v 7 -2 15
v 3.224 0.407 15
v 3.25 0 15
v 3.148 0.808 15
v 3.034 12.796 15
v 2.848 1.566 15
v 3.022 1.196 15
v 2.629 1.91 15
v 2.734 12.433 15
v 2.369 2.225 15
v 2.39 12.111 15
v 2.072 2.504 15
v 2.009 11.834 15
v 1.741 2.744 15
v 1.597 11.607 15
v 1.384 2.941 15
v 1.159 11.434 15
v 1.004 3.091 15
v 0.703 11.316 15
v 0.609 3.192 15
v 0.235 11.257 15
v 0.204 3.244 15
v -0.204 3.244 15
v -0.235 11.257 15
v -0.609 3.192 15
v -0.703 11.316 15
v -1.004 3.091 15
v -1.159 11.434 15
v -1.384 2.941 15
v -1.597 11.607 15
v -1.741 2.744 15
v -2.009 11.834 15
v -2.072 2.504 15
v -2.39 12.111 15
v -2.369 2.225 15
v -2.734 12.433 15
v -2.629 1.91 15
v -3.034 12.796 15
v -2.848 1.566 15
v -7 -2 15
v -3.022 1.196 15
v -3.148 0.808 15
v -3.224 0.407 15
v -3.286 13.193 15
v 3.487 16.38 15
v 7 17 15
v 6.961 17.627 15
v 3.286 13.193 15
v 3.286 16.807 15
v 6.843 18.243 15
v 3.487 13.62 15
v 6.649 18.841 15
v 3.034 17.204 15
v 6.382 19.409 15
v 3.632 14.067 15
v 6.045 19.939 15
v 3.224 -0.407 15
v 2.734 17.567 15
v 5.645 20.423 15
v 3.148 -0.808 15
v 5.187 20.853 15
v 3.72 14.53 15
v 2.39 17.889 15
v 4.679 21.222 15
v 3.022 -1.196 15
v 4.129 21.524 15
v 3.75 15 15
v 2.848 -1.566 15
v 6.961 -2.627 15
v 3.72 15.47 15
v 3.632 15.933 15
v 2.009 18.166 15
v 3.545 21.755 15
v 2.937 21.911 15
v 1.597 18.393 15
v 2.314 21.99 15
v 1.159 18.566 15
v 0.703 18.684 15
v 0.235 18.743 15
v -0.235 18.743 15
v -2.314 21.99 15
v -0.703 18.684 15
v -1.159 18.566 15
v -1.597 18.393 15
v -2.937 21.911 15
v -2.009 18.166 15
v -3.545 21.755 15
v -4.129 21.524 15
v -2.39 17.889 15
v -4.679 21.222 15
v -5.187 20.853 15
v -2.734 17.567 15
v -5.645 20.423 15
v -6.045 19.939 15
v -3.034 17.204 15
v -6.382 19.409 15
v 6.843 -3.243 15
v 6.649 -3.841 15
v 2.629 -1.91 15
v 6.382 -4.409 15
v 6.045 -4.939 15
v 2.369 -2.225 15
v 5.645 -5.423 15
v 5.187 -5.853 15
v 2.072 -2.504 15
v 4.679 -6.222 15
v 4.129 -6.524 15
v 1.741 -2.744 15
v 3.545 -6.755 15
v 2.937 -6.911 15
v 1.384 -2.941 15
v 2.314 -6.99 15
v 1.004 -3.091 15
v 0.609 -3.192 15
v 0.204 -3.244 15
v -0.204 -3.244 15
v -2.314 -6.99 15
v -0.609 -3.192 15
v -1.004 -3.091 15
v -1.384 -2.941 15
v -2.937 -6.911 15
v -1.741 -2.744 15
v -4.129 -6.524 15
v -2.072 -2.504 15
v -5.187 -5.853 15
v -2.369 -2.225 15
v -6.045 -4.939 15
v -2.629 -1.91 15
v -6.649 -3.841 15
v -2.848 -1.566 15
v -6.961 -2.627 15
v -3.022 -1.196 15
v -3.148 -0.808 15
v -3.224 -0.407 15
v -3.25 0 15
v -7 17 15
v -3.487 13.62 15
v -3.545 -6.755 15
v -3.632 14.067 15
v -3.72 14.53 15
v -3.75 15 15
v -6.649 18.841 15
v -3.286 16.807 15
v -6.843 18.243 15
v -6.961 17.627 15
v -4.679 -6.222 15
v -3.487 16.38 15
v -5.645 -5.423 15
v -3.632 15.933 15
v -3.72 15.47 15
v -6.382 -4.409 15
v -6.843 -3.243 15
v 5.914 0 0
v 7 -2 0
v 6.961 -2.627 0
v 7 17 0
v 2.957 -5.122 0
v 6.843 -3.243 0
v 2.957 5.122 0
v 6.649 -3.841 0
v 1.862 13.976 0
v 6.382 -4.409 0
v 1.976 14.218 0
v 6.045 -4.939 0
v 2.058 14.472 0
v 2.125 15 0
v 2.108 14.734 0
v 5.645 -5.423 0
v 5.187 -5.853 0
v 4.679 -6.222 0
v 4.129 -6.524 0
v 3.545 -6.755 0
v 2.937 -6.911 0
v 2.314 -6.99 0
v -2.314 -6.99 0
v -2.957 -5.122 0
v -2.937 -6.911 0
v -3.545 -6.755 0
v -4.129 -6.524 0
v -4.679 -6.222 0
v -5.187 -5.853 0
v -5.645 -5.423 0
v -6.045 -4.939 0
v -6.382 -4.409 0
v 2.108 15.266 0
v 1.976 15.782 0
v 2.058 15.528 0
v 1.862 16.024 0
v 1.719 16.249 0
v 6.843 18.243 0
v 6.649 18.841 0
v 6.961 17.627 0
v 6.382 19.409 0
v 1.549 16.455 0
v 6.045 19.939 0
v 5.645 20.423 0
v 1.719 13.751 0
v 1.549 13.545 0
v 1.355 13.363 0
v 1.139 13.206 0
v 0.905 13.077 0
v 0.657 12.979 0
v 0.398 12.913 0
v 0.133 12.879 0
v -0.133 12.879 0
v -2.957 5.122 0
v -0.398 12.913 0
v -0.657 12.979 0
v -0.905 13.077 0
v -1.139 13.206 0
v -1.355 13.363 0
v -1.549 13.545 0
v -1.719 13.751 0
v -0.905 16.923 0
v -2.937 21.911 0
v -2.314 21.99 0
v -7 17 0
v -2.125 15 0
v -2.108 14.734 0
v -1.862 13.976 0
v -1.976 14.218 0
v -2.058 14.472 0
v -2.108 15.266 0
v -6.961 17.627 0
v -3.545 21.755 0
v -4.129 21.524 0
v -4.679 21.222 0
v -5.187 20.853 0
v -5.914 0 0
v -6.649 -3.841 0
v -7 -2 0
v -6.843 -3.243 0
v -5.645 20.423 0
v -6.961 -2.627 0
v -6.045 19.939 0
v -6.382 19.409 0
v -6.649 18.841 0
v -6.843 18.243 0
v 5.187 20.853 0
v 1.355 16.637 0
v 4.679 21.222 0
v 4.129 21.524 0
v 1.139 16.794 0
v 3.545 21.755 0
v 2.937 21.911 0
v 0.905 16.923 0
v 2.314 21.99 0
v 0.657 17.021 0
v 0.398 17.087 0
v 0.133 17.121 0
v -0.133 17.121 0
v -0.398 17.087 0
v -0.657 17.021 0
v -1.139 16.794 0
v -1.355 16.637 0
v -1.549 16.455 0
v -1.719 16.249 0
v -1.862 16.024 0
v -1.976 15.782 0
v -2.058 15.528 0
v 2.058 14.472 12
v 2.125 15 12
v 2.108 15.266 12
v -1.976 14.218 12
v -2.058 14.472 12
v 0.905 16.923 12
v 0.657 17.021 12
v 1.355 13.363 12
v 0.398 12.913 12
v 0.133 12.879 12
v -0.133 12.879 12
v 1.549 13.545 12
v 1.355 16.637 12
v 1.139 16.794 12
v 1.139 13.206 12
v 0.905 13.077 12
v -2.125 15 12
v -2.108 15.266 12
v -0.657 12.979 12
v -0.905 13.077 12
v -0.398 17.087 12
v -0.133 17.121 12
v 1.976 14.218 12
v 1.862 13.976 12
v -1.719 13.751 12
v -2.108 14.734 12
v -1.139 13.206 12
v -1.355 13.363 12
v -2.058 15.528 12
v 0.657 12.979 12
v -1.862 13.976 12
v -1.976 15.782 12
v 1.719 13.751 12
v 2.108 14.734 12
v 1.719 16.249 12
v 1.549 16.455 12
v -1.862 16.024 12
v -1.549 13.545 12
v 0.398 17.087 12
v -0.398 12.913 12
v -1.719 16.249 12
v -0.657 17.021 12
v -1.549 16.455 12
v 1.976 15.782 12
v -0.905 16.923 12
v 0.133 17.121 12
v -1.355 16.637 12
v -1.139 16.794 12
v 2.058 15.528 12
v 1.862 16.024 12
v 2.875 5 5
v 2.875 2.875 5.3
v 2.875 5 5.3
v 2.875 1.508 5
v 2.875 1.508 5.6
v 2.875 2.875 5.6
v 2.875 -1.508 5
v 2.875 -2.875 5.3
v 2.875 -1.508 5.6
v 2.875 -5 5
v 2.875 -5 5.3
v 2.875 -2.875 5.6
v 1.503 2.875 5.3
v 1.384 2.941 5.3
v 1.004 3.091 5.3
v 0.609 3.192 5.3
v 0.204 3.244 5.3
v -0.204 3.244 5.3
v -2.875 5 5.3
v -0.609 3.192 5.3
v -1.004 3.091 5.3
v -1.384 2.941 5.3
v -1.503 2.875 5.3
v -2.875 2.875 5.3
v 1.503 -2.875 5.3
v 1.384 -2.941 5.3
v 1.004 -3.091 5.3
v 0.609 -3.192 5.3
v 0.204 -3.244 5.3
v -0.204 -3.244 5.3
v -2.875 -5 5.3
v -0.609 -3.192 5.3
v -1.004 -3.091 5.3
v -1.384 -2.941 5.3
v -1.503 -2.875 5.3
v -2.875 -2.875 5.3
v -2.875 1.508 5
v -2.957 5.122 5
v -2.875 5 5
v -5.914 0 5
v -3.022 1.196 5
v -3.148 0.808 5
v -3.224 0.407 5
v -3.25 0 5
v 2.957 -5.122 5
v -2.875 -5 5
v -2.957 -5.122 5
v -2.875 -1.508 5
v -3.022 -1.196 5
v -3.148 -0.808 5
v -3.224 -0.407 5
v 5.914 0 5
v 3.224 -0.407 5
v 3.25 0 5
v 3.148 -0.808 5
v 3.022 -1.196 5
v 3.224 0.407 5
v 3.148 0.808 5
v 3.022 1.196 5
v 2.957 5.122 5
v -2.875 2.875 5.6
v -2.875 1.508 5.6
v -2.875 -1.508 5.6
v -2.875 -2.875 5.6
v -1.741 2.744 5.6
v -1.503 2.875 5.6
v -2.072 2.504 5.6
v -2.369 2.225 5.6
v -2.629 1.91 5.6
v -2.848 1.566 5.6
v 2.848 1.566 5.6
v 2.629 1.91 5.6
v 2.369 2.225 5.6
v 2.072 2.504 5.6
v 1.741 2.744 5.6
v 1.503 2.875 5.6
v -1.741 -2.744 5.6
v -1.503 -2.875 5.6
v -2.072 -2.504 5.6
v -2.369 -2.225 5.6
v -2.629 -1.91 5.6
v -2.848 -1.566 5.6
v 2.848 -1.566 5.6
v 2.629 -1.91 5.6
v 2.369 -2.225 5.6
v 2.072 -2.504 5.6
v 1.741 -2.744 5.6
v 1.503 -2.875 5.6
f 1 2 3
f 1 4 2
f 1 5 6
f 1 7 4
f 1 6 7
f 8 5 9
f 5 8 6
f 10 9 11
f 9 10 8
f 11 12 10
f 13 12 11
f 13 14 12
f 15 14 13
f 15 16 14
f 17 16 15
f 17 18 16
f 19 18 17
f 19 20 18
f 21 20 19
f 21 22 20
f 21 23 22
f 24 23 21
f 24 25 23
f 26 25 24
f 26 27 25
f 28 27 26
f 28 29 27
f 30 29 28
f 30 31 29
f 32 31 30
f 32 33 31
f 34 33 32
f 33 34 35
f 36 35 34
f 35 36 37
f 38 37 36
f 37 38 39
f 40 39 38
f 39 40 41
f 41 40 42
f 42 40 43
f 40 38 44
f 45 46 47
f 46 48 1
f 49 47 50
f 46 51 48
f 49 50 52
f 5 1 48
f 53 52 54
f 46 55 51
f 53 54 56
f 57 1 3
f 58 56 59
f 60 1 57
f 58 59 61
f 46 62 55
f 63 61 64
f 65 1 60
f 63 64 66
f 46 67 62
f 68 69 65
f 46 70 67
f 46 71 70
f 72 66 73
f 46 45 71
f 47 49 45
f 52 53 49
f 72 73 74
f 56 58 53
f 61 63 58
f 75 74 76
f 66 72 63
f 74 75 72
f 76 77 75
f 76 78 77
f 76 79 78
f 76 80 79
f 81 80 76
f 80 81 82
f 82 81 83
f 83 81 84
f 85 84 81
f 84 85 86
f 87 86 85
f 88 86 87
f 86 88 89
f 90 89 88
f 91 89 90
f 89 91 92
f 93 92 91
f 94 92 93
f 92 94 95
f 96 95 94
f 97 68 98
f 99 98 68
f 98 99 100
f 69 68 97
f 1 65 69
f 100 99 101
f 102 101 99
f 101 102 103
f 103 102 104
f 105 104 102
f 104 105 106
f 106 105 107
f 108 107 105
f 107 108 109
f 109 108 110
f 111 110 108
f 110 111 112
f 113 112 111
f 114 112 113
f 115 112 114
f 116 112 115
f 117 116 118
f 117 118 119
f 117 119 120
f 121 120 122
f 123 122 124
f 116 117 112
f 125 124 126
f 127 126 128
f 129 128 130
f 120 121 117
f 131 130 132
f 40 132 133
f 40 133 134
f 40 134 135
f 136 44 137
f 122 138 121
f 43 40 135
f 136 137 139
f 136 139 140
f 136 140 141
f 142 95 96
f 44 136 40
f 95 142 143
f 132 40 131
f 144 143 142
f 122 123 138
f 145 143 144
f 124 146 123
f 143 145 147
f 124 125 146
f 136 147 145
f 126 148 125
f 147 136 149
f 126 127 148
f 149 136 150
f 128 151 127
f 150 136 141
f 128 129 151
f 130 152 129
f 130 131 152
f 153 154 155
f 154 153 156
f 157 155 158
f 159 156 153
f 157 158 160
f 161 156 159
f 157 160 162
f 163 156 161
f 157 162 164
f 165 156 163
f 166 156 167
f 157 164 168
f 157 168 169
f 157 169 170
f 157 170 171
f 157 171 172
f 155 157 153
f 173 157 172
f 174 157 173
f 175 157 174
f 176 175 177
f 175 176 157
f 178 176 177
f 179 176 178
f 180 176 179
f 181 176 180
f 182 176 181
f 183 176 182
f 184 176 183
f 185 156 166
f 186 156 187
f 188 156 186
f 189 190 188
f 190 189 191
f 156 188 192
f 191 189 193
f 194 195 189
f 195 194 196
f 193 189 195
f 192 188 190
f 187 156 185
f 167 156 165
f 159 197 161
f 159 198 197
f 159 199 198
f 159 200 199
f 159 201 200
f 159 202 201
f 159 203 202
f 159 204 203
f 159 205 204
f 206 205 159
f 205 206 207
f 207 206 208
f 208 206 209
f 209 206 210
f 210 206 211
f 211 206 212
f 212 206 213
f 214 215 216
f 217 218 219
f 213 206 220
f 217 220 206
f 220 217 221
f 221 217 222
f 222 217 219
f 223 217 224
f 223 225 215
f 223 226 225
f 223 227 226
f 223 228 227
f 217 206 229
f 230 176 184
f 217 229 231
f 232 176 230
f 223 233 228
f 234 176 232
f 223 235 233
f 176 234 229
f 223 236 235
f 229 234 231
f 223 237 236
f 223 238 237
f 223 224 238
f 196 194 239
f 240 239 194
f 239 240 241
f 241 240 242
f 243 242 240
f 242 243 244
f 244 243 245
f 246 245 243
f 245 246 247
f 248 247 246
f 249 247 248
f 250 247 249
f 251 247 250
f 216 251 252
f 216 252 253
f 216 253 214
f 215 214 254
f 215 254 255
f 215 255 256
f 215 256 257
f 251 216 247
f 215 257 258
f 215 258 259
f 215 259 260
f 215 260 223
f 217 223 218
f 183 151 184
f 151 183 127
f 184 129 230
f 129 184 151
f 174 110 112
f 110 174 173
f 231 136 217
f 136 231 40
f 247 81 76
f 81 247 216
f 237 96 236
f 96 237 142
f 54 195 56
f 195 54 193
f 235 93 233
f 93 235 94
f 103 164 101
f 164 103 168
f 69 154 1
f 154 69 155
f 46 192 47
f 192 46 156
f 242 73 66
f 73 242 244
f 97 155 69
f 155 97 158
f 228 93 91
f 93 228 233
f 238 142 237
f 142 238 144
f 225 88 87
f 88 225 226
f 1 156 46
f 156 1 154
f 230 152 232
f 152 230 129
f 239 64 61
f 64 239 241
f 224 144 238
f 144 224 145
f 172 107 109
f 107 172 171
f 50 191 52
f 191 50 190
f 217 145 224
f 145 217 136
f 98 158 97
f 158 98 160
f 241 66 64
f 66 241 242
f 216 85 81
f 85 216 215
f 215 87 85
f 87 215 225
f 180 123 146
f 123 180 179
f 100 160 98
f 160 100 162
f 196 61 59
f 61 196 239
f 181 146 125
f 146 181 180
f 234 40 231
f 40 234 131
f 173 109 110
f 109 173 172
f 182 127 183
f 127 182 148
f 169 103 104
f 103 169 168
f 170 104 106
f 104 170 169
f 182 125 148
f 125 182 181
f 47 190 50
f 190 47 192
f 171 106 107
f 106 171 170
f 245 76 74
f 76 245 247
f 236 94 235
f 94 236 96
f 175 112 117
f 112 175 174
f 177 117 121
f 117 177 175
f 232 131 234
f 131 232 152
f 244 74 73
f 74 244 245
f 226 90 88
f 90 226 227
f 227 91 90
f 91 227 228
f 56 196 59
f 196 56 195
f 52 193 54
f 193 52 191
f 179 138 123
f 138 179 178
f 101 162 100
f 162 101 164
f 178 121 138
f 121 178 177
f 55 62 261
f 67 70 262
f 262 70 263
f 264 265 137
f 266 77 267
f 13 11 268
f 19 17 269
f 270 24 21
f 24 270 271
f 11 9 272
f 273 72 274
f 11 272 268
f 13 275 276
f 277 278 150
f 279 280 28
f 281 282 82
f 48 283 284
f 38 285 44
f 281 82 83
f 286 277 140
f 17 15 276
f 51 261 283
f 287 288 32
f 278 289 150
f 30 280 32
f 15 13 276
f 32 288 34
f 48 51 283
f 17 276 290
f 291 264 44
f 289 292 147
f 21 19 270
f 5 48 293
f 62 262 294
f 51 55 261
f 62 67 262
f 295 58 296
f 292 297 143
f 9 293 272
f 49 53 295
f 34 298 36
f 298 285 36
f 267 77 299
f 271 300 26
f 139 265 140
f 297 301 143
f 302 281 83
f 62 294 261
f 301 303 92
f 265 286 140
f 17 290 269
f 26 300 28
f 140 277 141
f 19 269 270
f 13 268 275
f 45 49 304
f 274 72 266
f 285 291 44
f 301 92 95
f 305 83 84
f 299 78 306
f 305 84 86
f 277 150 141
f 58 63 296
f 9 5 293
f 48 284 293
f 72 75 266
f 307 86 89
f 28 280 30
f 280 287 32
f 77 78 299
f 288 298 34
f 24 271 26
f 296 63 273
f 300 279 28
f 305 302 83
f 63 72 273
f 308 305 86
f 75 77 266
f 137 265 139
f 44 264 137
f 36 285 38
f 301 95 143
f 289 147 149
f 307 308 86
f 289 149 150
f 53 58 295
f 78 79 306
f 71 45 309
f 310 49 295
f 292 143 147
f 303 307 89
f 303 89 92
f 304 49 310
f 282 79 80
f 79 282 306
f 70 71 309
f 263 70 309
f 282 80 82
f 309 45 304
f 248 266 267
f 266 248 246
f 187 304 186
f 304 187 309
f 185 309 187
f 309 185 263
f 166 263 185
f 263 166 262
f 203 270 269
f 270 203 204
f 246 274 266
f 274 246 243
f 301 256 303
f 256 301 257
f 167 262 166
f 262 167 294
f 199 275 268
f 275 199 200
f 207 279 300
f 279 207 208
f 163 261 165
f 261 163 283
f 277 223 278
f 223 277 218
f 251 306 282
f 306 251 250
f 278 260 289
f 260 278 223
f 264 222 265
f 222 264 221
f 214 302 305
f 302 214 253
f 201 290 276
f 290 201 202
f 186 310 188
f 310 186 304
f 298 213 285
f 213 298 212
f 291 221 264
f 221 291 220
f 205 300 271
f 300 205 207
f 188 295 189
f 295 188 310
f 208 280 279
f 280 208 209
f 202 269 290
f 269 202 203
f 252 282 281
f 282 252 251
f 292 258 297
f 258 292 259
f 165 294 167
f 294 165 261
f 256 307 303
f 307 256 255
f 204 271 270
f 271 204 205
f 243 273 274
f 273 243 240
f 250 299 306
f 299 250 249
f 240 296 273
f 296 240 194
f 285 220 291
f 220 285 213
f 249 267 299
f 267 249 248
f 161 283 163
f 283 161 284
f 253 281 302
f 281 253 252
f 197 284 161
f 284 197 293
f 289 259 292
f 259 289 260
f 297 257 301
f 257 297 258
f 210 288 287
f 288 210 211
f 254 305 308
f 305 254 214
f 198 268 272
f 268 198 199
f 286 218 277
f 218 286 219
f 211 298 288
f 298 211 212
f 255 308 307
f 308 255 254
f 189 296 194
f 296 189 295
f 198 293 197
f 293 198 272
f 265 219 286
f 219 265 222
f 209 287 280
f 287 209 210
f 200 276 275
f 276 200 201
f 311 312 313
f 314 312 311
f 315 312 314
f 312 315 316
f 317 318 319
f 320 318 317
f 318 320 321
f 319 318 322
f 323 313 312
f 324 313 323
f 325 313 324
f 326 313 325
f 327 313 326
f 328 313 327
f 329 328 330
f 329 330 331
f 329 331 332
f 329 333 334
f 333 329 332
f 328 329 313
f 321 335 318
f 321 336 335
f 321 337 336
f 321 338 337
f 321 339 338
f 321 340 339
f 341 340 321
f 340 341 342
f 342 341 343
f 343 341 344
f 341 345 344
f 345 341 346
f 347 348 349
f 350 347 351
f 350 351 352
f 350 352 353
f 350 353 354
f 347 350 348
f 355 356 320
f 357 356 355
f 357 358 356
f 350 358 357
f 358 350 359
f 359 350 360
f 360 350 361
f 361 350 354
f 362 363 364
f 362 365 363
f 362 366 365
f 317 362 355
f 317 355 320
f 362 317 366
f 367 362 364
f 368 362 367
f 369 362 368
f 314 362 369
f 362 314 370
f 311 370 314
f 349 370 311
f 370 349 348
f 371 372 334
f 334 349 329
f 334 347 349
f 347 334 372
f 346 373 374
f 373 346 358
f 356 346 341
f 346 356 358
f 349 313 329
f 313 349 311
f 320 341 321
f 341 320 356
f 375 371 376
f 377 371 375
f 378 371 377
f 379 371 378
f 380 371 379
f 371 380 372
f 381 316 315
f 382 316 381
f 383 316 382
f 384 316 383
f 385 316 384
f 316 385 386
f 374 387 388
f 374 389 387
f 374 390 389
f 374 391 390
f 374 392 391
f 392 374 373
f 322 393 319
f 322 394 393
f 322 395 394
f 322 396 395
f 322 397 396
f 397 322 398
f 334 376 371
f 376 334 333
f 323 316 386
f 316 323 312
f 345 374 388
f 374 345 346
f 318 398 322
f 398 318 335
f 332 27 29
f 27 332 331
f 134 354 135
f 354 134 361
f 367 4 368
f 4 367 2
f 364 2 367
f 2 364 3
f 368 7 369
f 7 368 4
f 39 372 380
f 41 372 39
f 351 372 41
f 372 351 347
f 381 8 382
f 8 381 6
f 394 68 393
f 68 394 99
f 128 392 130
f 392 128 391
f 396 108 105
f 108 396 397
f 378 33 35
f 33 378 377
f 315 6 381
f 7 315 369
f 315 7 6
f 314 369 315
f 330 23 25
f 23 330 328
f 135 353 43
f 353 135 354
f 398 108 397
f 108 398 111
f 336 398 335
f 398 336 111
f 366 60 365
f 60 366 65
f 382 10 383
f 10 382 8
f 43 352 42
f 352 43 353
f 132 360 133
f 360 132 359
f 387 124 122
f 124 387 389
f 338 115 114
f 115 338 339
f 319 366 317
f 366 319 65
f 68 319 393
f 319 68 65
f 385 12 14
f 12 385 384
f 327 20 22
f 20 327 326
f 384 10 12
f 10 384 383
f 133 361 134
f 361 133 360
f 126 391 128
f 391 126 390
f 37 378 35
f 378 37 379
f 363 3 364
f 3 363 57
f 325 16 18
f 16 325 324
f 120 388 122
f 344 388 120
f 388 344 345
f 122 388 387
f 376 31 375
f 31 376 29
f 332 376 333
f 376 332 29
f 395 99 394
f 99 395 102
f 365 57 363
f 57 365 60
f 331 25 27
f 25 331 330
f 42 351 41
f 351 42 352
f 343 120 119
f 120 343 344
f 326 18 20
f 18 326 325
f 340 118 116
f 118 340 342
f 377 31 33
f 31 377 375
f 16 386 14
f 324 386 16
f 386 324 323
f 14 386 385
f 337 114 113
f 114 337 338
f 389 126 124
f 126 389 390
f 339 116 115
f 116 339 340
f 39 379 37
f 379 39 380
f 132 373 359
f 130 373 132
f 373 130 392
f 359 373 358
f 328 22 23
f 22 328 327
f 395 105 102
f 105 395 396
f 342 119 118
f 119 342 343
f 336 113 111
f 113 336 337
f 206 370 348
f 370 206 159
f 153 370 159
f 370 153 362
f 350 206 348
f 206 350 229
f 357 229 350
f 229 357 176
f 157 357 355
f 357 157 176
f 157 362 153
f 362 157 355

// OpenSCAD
$fn = 50;


difference() {
	union() {
		cylinder(h = 15, r = 7.0000000000);
		translate(v = [0.0000000000, 7.5000000000, 0]) {
			hull() {
				translate(v = [-2.0000000000, 9.5000000000, 0]) {
					cylinder(h = 15, r = 5);
				}
				translate(v = [2.0000000000, 9.5000000000, 0]) {
					cylinder(h = 15, r = 5);
				}
				translate(v = [-2.0000000000, -9.5000000000, 0]) {
					cylinder(h = 15, r = 5);
				}
				translate(v = [2.0000000000, -9.5000000000, 0]) {
					cylinder(h = 15, r = 5);
				}
			}
		}
		translate(v = [0.0000000000, 7.5000000000, 0]) {
			hull() {
				translate(v = [-2.0000000000, 9.5000000000, 0]) {
					cylinder(h = 15, r = 5);
				}
				translate(v = [2.0000000000, 9.5000000000, 0]) {
					cylinder(h = 15, r = 5);
				}
				translate(v = [-2.0000000000, -9.5000000000, 0]) {
					cylinder(h = 15, r = 5);
				}
				translate(v = [2.0000000000, -9.5000000000, 0]) {
					cylinder(h = 15, r = 5);
				}
			}
		}
	}
	union() {
		translate(v = [0.0000000000, 15.0000000000, 15]) {
			rotate(a = [0, 0, 0]) {
				difference() {
					union() {
						#translate(v = [0, 0, -15.0000000000]) {
							cylinder(h = 15, r = 2.0000000000);
						}
						#translate(v = [0, 0, -3]) {
							cylinder(h = 3, r1 = 2.1250000000, r2 = 3.7500000000);
						}
						#translate(v = [0, 0, -15.0000000000]) {
							cylinder(h = 15, r = 2.1250000000);
						}
						#translate(v = [0, 0, -15.0000000000]) {
							cylinder(h = 15, r = 2.0000000000);
						}
					}
					union();
				}
			}
		}
		translate(v = [0.0000000000, 15.0000000000, 15]) {
			rotate(a = [0, 0, 0]) {
				difference() {
					union() {
						#translate(v = [0, 0, -15.0000000000]) {
							cylinder(h = 15, r = 2.0000000000);
						}
						#translate(v = [0, 0, -3]) {
							cylinder(h = 3, r1 = 2.1250000000, r2 = 3.7500000000);
						}
						#translate(v = [0, 0, -15.0000000000]) {
							cylinder(h = 15, r = 2.1250000000);
						}
						#translate(v = [0, 0, -15.0000000000]) {
							cylinder(h = 15, r = 2.0000000000);
						}
					}
					union();
				}
			}
		}
		translate(v = [0.0000000000, 0.0000000000, 0]) {
			rotate(a = [0, 0, 0]) {
				difference() {
					union() {
						#translate(v = [-2.8750000000, -5.0000000000, -0.3000000000]) {
							cube(size = [5.7500000000, 10, 0.3000000000]);
						}
						#translate(v = [-2.8750000000, -2.8750000000, -0.6000000000]) {
							cube(size = [5.7500000000, 5.7500000000, 0.3000000000]);
						}
						#translate(v = [-2.8750000000, -5.0000000000, 5]) {
							cube(size = [5.7500000000, 10, 0.3000000000]);
						}
						#translate(v = [-2.8750000000, -2.8750000000, 5.3000000000]) {
							cube(size = [5.7500000000, 5.7500000000, 0.3000000000]);
						}
						#translate(v = [0, 0, -100.0000000000]) {
							cylinder(h = 200, r = 3.2500000000);
						}
						#linear_extrude(height = 5) {
							polygon(points = [[5.9142500000, 0.0000000000], [2.9571250000, 5.1218907443], [-2.9571250000, 5.1218907443], [-5.9142500000, 0.0000000000], [-2.9571250000, -5.1218907443], [2.9571250000, -5.1218907443]]);
						}
						#translate(v = [-2.8750000000, -5.0000000000, -0.3000000000]) {
							cube(size = [5.7500000000, 10, 0.3000000000]);
						}
						#translate(v = [-2.8750000000, -2.8750000000, -0.6000000000]) {
							cube(size = [5.7500000000, 5.7500000000, 0.3000000000]);
						}
						#translate(v = [-2.8750000000, -5.0000000000, 5]) {
							cube(size = [5.7500000000, 10, 0.3000000000]);
						}
						#translate(v = [-2.8750000000, -2.8750000000, 5.3000000000]) {
							cube(size = [5.7500000000, 5.7500000000, 0.3000000000]);
						}
						#translate(v = [0, 0, -100.0000000000]) {
							cylinder(h = 200, r = 3.2500000000);
						}
						#translate(v = [-2.8750000000, -5.0000000000, -0.3000000000]) {
							cube(size = [5.7500000000, 10, 0.3000000000]);
						}
						#translate(v = [-2.8750000000, -2.8750000000, -0.6000000000]) {
							cube(size = [5.7500000000, 5.7500000000, 0.3000000000]);
						}
						#translate(v = [-2.8750000000, -5.0000000000, 5]) {
							cube(size = [5.7500000000, 10, 0.3000000000]);
						}
						#translate(v = [-2.8750000000, -2.8750000000, 5.3000000000]) {
							cube(size = [5.7500000000, 5.7500000000, 0.3000000000]);
						}
						#translate(v = [0, 0, -100.0000000000]) {
							cylinder(h = 200, r = 3.2500000000);
						}
					}
					union();
				}
			}
		}
		translate(v = [0, 0, -100]) {
			cylinder(h = 200, r = 3.2500000000);
		}
		translate(v = [0, 0, -100]) {
			cylinder(h = 200, r = 1.8000000000);
		}
	}
}
